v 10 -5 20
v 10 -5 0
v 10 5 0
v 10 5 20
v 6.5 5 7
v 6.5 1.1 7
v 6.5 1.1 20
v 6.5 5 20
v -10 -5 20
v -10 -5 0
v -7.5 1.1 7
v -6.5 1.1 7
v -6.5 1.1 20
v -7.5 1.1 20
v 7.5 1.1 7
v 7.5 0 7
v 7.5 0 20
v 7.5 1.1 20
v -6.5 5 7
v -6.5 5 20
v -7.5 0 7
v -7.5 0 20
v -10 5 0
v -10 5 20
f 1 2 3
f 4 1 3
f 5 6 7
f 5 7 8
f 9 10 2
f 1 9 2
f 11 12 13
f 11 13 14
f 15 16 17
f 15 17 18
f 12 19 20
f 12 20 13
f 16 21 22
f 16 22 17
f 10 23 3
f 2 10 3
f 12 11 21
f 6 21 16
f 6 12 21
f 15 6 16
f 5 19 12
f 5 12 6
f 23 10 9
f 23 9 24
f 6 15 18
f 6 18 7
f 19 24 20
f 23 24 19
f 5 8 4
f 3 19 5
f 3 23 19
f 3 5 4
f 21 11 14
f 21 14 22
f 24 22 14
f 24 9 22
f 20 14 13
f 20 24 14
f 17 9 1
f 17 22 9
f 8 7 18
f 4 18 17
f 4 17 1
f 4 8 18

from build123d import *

# Parameters (mm, degrees)
SKETCH1_W               = 20
SKETCH1_H               = 10
BOSS_EXTRUDE1_DEPTH     = 20
CUT_EXTRUDE1_DEPTH      = 23.912878475
CUT_EXTRUDE1_DEPTH_BACK = 13


with BuildPart() as part:
    # Sketch1 → Boss-Extrude1 (new body)
    with BuildSketch(Plane.XY):
        Rectangle(SKETCH1_W, SKETCH1_H)
    extrude(amount=BOSS_EXTRUDE1_DEPTH)

    # Sketch2 → Cut-Extrude1 (cut, two sides: drawn at the far end of the back side and taken through both)
    with BuildSketch(Plane.XY.offset(20).offset(-CUT_EXTRUDE1_DEPTH_BACK)):
        Polygon((-6.5, 53.587562763), (-6.5, 5), (-6.5, 1.1), (-7.5, 1.1), (-7.5, 0), (0, 0), (7.5, 0), (7.5, 1.1), (6.5, 1.1), (6.5, 5), (6.5, 53.587562763), (6.5, 150.762688289), (-6.5, 150.762688289), align=None)
    extrude(amount=CUT_EXTRUDE1_DEPTH + CUT_EXTRUDE1_DEPTH_BACK, mode=Mode.SUBTRACT)


solid = part.part
